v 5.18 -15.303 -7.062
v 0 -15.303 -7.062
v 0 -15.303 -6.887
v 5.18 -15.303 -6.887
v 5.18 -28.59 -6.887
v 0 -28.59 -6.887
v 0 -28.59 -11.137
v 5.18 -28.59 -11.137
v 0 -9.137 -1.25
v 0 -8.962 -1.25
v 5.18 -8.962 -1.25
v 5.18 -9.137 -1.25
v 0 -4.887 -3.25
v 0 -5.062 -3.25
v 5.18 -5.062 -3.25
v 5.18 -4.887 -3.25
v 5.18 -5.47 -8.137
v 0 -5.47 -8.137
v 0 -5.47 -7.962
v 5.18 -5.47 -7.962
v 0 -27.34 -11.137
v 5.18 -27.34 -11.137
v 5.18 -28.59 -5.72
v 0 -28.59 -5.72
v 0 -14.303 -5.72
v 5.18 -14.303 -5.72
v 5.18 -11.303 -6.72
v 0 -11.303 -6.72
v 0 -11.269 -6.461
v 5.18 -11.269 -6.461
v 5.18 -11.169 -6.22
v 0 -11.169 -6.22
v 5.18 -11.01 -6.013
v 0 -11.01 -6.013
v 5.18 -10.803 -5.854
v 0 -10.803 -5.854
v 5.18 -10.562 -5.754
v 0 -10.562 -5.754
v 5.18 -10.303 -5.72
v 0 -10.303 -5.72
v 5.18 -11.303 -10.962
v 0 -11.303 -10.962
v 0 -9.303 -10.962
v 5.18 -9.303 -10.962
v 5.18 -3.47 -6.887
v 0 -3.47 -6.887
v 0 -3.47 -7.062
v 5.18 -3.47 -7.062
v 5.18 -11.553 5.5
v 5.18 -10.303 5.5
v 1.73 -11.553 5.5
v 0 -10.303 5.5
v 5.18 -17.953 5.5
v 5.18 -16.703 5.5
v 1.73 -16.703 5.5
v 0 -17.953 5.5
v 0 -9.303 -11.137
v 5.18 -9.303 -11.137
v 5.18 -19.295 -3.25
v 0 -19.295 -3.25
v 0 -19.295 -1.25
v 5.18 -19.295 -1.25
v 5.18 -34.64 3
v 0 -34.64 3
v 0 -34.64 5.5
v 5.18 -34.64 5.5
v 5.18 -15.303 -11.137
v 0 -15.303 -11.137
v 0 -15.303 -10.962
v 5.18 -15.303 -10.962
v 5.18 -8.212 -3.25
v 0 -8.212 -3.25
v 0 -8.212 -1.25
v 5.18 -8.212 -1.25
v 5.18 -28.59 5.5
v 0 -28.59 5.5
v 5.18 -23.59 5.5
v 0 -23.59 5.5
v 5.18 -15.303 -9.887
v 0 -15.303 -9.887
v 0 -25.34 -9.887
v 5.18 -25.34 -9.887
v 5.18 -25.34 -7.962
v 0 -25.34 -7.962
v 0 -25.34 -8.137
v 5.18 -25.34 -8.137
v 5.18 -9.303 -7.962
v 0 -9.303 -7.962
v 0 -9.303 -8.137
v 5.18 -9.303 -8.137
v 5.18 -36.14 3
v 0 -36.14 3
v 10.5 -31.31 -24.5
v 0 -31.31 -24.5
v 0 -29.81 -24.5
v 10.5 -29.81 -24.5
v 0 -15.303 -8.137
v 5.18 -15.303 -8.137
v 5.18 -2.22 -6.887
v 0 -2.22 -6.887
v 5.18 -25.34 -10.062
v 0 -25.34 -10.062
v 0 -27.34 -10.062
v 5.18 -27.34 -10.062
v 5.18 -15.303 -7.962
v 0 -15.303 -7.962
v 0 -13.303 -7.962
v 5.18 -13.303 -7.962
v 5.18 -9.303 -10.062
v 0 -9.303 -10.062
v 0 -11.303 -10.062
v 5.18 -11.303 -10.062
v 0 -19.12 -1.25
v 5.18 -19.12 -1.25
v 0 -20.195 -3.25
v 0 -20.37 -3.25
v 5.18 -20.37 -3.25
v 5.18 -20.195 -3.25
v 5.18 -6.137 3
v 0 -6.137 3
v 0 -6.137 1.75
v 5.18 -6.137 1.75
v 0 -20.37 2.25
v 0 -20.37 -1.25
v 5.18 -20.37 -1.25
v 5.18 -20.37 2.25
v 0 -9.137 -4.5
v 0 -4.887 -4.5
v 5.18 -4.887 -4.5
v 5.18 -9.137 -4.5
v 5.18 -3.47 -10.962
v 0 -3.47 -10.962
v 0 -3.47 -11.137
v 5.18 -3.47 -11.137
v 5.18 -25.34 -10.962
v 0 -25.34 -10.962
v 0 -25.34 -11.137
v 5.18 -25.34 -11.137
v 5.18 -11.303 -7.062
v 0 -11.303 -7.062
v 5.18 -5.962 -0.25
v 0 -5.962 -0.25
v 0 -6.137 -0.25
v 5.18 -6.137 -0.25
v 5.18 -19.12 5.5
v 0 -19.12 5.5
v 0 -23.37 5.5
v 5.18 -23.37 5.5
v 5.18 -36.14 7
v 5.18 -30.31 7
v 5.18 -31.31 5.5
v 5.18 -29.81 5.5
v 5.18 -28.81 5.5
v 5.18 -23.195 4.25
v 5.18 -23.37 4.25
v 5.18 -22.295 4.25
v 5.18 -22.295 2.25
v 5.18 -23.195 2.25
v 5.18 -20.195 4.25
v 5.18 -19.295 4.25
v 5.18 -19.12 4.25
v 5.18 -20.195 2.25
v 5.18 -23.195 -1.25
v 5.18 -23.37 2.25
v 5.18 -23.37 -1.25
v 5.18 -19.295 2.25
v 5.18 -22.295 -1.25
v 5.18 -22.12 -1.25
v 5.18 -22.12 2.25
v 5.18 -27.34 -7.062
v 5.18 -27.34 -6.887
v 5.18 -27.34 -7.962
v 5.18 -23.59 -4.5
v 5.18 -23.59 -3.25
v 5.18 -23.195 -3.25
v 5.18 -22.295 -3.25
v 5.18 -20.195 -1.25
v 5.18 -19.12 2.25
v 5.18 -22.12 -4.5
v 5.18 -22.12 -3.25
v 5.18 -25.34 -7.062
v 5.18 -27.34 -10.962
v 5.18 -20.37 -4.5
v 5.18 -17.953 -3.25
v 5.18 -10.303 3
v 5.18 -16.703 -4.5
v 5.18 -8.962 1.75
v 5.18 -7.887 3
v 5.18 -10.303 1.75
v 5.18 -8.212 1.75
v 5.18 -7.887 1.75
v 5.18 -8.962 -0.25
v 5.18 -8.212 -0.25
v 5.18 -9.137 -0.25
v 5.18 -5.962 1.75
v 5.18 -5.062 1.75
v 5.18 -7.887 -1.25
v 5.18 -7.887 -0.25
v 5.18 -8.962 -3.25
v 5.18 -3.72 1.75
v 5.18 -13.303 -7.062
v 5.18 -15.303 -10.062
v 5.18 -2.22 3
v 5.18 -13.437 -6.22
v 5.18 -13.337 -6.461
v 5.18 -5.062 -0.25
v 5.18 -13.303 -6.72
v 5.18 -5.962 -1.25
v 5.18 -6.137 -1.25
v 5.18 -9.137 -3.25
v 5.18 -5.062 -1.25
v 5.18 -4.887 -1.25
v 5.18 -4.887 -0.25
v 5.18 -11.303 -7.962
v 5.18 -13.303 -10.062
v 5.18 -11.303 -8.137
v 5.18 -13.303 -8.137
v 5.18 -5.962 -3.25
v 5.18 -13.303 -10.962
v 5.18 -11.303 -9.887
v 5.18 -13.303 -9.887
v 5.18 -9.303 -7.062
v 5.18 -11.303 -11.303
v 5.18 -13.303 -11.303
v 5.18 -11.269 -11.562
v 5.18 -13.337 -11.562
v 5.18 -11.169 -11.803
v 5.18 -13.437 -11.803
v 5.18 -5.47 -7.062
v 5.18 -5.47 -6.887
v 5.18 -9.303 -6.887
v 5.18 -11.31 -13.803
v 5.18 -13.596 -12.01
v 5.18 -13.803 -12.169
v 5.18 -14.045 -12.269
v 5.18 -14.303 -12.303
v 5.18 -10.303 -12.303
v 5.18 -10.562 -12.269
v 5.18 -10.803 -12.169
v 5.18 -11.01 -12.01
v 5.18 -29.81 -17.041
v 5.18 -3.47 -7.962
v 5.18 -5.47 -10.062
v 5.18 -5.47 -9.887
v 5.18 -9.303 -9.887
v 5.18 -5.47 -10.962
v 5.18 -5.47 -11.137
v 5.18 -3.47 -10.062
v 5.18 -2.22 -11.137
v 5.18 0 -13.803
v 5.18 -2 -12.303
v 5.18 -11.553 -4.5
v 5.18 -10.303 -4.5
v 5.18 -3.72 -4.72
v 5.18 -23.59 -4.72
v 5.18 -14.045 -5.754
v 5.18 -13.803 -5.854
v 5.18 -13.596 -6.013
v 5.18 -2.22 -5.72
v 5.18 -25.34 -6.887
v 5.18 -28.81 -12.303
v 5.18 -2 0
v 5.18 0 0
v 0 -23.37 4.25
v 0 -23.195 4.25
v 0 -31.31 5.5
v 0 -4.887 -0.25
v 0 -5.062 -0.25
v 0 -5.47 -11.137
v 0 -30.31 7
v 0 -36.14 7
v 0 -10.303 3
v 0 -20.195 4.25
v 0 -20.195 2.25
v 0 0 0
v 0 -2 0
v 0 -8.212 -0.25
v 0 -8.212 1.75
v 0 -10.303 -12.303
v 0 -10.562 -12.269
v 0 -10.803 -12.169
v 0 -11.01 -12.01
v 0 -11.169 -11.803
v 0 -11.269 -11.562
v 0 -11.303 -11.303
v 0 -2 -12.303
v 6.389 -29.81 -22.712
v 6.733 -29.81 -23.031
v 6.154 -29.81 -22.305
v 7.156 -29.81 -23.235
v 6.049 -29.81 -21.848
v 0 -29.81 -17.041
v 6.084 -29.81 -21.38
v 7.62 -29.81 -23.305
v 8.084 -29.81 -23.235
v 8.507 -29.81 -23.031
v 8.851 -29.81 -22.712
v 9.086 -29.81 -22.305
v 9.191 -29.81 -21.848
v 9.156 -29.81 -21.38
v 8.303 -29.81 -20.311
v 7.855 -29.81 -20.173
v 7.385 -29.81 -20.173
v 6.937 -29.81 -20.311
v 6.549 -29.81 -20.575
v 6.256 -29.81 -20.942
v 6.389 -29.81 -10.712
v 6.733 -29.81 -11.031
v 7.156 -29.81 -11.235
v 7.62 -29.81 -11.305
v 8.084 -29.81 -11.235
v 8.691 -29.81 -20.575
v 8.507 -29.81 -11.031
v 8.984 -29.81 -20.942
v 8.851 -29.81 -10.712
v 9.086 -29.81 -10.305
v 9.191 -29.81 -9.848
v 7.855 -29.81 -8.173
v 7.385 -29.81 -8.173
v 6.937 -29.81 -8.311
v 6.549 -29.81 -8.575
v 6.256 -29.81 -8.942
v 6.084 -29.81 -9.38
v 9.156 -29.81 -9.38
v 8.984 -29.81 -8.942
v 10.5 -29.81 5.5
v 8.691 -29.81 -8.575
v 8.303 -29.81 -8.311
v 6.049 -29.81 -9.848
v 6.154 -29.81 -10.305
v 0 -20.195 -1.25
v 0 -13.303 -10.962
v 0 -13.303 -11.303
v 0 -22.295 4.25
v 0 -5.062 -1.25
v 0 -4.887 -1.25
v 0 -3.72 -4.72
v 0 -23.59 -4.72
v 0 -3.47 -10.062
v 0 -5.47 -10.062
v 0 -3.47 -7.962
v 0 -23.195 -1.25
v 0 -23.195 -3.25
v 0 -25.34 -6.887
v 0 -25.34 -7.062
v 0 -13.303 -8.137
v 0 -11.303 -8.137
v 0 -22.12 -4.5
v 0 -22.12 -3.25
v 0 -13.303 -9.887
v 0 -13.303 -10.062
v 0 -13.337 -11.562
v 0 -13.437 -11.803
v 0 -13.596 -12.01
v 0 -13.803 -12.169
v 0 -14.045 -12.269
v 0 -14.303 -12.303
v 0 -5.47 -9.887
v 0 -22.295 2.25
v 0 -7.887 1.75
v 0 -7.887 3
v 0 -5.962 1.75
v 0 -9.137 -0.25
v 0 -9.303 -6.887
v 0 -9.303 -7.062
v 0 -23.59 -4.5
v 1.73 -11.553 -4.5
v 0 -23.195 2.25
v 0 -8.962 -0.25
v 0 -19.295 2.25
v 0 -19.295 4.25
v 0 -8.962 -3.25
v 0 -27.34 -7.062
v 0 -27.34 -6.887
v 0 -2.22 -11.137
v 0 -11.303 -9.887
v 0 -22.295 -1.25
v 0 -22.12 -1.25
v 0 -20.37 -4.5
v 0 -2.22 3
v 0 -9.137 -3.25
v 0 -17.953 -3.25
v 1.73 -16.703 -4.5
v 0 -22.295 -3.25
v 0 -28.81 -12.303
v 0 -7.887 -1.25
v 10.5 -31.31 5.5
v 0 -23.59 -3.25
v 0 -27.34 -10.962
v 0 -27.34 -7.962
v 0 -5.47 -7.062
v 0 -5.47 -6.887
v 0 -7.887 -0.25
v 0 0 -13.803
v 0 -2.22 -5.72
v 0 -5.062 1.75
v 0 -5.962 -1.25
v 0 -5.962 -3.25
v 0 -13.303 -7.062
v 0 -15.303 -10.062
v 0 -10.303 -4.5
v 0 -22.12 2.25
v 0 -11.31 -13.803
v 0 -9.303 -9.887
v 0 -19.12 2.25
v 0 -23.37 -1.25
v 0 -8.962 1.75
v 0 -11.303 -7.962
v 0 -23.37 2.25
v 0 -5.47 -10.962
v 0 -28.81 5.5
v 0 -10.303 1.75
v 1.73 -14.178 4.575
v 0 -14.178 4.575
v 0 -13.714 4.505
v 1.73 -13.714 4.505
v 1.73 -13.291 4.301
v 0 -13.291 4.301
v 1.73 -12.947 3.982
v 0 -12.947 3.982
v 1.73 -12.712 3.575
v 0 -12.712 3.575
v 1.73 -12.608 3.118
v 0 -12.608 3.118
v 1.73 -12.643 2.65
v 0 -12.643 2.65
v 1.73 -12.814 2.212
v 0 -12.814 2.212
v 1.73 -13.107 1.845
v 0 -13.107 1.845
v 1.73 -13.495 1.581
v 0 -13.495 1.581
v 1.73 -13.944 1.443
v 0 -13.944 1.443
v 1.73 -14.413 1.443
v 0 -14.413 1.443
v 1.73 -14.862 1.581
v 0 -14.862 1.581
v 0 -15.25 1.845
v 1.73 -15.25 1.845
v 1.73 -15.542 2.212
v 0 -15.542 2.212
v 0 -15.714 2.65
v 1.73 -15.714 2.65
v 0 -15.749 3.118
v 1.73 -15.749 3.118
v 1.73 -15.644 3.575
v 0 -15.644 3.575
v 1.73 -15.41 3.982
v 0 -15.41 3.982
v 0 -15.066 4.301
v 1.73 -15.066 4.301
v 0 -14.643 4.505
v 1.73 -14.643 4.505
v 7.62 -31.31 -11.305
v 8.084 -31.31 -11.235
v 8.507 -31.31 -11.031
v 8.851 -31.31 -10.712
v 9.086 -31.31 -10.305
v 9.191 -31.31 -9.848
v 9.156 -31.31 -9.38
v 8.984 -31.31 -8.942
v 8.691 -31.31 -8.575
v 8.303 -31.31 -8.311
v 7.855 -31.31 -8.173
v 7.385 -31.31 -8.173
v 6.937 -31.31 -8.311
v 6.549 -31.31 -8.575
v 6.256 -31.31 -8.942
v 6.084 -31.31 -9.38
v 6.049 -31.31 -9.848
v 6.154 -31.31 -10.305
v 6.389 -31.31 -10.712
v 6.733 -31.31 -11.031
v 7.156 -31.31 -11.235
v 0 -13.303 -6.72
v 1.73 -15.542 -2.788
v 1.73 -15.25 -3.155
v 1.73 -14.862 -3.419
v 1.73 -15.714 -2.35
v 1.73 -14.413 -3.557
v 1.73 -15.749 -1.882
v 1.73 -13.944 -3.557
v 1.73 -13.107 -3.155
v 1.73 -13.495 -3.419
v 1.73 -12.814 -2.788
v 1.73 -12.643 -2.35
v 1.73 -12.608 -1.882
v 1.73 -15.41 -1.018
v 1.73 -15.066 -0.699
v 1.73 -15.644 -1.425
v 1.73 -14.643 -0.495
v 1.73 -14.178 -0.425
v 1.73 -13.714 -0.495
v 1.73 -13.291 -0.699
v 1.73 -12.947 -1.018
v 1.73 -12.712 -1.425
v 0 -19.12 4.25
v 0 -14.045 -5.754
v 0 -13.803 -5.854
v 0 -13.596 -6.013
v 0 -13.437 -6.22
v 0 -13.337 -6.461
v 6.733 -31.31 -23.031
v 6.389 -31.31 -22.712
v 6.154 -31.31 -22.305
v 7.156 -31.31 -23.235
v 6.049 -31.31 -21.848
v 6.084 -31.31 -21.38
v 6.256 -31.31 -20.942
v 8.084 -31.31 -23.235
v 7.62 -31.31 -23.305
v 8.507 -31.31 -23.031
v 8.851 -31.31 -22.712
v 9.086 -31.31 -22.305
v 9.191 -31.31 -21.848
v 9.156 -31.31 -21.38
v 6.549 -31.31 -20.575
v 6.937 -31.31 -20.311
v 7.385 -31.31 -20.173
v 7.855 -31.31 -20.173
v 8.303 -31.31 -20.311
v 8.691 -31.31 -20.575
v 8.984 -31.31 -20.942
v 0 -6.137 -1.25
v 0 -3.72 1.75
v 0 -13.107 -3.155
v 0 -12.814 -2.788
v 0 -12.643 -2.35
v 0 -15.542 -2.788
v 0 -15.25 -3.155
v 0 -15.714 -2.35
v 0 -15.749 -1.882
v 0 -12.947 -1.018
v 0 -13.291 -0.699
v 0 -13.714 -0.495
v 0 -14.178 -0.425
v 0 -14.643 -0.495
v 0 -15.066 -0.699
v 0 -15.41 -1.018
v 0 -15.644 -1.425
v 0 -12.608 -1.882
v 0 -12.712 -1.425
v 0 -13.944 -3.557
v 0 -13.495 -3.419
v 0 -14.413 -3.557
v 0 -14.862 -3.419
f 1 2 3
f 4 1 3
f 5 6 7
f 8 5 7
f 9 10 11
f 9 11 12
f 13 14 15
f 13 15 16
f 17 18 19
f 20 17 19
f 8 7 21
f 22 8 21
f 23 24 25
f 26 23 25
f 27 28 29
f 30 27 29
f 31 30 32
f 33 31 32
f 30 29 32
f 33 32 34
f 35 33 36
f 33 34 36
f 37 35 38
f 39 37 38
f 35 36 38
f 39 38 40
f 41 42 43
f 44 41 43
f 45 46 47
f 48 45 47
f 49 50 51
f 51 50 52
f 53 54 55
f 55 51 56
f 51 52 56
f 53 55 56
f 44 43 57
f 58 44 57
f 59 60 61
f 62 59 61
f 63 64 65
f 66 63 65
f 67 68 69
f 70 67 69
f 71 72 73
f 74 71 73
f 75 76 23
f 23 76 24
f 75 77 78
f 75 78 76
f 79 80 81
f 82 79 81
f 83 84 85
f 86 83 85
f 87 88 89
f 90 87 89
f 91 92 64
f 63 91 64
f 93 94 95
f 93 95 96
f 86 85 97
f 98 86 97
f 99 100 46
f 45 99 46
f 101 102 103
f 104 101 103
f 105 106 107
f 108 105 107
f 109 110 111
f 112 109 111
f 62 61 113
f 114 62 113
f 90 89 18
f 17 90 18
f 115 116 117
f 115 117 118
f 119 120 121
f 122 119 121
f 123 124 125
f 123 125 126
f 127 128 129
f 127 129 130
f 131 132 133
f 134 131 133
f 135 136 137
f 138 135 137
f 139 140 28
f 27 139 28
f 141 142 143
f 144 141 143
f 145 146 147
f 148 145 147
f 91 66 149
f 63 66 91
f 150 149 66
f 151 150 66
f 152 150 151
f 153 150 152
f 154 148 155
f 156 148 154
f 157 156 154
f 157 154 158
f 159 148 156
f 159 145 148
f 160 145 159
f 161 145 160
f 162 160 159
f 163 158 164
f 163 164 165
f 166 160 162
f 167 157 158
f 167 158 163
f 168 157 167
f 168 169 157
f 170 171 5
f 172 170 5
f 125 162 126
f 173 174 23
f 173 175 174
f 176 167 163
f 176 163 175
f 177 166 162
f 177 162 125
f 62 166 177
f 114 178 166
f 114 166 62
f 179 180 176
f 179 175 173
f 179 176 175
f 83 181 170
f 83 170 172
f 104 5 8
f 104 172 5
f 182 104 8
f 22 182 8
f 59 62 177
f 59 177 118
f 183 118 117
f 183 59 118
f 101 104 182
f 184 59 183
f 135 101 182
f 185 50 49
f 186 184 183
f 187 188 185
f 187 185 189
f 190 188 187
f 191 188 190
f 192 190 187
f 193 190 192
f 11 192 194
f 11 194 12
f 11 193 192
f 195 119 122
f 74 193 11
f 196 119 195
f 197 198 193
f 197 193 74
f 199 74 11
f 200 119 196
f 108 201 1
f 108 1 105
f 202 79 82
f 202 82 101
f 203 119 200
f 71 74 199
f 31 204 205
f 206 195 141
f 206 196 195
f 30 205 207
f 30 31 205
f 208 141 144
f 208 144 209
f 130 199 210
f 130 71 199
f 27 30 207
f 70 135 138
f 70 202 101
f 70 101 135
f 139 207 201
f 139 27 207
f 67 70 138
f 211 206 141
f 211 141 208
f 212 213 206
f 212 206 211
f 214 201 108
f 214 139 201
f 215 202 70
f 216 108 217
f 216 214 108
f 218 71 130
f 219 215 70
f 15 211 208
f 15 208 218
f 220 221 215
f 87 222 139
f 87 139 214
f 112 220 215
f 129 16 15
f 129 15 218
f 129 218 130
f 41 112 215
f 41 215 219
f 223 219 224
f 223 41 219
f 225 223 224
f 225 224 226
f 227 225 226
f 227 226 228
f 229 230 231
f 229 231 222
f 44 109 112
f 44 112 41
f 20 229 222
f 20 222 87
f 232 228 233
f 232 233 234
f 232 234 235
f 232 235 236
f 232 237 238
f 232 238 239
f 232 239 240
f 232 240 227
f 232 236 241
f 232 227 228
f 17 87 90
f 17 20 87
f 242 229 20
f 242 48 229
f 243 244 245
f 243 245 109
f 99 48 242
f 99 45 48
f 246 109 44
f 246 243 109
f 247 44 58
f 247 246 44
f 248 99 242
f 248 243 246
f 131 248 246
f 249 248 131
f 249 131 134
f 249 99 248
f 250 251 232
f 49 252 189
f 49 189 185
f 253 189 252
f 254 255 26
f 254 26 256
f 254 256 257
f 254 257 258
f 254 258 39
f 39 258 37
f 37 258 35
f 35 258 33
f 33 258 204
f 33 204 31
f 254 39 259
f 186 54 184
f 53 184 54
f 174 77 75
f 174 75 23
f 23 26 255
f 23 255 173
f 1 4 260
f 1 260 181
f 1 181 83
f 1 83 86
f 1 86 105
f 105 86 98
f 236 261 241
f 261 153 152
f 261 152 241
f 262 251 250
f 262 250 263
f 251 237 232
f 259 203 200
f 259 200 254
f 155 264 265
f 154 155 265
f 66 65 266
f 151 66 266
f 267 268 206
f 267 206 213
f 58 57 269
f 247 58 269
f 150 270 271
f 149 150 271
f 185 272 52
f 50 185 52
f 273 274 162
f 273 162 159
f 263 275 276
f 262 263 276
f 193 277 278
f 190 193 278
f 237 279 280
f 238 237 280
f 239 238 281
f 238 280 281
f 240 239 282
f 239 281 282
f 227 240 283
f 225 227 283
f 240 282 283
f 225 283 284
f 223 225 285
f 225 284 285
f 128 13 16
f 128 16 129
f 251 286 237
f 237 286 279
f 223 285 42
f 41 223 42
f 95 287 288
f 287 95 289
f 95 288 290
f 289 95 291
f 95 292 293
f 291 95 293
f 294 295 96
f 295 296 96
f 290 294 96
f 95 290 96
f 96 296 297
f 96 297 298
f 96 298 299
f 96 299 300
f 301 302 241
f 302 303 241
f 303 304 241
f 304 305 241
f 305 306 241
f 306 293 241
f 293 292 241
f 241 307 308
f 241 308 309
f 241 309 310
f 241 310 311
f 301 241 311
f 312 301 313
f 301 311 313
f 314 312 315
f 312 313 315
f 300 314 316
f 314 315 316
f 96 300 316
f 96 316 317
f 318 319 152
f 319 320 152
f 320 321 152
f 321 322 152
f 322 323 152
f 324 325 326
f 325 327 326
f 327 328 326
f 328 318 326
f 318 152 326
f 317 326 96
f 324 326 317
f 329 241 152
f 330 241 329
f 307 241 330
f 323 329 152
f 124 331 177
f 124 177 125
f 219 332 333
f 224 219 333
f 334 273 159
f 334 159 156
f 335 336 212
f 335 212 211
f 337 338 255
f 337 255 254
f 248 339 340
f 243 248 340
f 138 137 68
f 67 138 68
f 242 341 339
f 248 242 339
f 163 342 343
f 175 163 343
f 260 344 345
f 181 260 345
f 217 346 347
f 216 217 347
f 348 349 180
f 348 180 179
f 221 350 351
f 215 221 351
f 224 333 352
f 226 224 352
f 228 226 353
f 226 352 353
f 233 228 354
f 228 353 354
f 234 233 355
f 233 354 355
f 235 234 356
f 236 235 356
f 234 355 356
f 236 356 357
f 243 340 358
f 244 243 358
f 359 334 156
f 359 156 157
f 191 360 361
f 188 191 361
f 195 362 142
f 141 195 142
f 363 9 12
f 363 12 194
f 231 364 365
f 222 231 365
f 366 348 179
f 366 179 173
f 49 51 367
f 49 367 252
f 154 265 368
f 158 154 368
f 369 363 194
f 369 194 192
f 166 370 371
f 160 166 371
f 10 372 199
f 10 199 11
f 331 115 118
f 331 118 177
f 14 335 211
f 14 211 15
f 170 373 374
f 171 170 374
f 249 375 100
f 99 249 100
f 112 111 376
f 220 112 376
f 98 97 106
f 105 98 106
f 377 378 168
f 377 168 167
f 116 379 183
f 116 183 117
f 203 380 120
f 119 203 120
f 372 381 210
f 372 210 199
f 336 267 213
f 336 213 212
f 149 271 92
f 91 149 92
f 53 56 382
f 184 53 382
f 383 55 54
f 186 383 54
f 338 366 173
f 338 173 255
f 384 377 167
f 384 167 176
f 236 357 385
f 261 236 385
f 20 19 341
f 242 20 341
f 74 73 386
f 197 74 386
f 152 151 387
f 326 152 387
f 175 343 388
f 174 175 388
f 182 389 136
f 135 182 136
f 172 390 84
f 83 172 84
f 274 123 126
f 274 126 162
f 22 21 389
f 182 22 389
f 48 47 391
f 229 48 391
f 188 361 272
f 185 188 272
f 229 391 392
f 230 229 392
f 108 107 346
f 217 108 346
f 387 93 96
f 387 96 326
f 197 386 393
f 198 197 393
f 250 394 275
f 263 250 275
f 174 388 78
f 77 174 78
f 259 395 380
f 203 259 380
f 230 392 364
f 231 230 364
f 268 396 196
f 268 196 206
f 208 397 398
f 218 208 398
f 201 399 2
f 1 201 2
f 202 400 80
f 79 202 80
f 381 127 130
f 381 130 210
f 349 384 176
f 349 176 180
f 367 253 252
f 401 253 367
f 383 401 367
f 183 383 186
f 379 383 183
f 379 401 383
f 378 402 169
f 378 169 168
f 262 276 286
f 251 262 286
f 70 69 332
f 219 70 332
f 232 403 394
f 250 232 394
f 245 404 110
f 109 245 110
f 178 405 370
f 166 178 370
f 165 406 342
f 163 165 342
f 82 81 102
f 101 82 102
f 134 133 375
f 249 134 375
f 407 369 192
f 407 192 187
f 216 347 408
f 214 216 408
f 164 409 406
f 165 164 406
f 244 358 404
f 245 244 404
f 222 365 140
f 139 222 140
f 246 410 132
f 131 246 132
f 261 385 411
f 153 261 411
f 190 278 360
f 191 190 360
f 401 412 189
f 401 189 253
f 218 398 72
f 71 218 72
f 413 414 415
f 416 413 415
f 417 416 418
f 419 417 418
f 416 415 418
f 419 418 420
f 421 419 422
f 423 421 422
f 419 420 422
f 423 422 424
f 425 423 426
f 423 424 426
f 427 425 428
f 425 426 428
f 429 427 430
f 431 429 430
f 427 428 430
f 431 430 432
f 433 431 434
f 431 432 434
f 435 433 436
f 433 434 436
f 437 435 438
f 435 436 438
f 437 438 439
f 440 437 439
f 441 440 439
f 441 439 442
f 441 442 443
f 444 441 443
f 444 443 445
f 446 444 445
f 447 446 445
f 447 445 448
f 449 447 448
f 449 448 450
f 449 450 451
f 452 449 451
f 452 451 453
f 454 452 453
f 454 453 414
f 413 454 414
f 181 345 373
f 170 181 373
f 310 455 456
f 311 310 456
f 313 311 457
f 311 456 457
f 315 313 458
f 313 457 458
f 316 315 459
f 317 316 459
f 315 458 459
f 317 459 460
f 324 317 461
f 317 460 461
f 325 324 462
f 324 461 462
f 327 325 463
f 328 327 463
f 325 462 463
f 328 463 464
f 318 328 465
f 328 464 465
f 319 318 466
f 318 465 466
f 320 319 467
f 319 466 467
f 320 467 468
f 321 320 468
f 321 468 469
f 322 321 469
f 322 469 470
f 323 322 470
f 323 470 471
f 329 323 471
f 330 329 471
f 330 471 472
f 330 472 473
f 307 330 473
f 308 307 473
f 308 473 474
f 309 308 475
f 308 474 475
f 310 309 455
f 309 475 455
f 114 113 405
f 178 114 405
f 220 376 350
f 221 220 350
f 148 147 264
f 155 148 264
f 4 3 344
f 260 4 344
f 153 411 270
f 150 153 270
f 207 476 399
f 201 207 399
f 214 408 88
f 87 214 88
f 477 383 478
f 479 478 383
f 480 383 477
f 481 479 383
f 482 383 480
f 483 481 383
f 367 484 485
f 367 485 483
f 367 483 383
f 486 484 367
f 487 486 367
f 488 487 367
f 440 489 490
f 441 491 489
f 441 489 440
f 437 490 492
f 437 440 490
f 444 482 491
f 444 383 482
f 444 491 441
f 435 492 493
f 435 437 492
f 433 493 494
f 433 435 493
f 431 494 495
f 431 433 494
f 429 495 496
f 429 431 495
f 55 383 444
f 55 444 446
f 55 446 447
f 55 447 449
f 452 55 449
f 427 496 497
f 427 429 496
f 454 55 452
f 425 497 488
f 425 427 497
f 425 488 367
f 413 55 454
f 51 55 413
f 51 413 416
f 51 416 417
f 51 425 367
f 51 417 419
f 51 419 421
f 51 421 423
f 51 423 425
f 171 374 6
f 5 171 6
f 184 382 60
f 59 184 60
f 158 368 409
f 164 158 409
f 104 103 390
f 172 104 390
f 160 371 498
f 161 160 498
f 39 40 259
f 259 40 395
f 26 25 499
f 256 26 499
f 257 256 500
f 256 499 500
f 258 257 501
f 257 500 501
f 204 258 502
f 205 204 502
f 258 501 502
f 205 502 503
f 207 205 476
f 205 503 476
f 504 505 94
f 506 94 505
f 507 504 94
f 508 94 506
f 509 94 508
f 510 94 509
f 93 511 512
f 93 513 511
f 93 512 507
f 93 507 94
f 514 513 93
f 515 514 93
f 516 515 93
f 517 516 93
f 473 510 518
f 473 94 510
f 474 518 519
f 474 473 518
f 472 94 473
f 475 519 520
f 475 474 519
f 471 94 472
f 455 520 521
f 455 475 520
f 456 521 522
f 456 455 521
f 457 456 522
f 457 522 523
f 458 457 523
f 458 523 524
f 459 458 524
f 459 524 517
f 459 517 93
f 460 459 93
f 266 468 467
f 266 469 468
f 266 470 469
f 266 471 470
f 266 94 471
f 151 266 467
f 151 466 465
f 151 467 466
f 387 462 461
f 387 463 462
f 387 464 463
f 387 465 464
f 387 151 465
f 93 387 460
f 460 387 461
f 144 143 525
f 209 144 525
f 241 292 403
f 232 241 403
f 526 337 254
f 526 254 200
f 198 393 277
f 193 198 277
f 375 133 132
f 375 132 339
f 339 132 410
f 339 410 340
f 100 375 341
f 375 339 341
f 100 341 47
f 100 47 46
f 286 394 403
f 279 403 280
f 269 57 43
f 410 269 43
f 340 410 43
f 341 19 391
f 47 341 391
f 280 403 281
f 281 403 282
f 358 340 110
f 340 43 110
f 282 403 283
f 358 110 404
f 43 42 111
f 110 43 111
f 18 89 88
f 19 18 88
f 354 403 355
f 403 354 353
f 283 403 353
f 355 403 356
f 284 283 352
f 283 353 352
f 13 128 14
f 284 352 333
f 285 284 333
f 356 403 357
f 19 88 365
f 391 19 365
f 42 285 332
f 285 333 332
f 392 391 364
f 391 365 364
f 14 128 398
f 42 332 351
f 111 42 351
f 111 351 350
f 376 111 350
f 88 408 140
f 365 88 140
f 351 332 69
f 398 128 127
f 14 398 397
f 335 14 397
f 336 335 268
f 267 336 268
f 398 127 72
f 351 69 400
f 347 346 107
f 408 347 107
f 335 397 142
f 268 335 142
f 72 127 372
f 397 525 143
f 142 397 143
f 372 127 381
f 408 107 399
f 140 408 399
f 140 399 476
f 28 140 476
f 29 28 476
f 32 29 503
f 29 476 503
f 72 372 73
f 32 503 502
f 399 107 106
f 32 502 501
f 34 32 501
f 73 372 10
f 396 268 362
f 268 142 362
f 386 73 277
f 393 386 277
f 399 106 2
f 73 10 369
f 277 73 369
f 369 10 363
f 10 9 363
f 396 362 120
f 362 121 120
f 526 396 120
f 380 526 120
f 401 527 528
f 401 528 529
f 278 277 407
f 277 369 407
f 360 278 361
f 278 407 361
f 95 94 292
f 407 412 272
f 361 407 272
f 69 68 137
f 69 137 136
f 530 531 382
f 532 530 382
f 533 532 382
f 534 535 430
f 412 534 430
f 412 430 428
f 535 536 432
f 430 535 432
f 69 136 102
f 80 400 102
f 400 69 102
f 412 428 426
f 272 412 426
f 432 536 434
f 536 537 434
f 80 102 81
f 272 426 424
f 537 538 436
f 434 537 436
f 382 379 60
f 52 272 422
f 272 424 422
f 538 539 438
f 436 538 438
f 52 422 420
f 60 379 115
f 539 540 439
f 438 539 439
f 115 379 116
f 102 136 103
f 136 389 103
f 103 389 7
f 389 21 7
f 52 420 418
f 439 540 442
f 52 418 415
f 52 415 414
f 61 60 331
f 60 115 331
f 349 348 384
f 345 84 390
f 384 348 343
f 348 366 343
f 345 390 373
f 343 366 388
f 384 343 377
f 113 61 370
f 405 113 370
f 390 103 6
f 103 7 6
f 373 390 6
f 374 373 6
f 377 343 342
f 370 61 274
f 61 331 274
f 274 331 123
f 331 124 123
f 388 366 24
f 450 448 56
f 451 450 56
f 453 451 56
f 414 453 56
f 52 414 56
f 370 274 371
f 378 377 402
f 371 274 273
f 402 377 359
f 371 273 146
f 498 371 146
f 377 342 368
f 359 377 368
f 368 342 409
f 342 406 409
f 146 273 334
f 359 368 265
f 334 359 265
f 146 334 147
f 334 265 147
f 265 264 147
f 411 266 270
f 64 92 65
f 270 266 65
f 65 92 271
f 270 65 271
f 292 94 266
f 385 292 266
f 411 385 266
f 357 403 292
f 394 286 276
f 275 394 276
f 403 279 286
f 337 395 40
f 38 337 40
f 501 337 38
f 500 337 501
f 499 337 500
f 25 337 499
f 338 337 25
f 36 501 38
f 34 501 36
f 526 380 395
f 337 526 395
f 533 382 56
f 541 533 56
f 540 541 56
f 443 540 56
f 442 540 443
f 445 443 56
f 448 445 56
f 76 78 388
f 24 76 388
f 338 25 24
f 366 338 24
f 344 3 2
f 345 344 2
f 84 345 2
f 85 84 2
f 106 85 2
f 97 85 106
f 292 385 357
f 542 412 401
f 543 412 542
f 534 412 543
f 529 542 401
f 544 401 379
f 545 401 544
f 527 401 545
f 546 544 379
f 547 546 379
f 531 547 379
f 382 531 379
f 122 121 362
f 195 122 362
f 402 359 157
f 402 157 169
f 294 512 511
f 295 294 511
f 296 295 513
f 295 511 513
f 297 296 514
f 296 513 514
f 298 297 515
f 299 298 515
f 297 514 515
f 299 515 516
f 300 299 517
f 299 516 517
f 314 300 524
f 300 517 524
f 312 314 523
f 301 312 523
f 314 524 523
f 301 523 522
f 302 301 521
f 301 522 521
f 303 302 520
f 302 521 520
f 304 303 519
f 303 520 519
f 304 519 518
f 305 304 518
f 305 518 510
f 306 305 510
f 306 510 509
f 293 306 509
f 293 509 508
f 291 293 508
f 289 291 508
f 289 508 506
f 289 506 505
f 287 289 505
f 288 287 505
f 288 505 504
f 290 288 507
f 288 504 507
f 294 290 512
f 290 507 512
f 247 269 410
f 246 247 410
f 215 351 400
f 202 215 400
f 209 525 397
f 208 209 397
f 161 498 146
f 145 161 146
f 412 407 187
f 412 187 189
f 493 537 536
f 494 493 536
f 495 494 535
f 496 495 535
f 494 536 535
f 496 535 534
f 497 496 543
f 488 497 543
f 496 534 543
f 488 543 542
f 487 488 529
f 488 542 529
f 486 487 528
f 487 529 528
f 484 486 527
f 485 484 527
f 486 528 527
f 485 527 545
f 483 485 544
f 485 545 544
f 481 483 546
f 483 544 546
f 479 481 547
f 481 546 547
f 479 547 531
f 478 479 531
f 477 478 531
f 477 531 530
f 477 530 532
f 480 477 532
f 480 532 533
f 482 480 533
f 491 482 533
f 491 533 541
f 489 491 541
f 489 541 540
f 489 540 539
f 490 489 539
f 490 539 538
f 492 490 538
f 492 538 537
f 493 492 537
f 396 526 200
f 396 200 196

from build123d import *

# Parameters (mm, degrees)
BOSS_EXTRUDE1_DEPTH = 5.18
CUT_EXTRUDE4_REACH  = 45.046
SKETCH2_W           = 3.45
SKETCH2_H           = 5.15
CUT_EXTRUDE3_REACH  = 42.402
SKETCH7_R           = 1.575
SKETCH3_W           = 10.5
SKETCH3_H           = 30
SKETCH3_R           = 1.575
BOSS_EXTRUDE2_DEPTH = 1.5


with BuildPart() as part:
    # Sketch1 → Boss-Extrude1 (new body)
    with BuildSketch(Plane(origin=(0, 0, 0), x_dir=(0, 0, -1), z_dir=(1, 0, 0))):
        with BuildLine():
            Line((-5.5, -10.303333333), (-5.5, -17.953333333))
            Line((-5.5, -17.953333333), (3.25, -17.953333333))
            Line((3.25, -17.953333333), (3.25, -19.295))
            Line((3.25, -19.295), (1.25, -19.295))
            Line((1.25, -19.295), (1.25, -19.12))
            Line((1.25, -19.12), (-2.25, -19.12))
            Line((-2.25, -19.12), (-2.25, -19.295))
            Line((-2.25, -19.295), (-4.25, -19.295))
            Line((-4.25, -19.295), (-4.25, -19.12))
            Line((-4.25, -19.12), (-5.5, -19.12))
            Line((-5.5, -19.12), (-5.5, -23.37))
            Line((-5.5, -23.37), (-4.25, -23.37))
            Line((-4.25, -23.37), (-4.25, -23.195))
            Line((-4.25, -23.195), (-2.25, -23.195))
            Line((-2.25, -23.195), (-2.25, -23.37))
            Line((-2.25, -23.37), (1.25, -23.37))
            Line((1.25, -23.37), (1.25, -23.195))
            Line((1.25, -23.195), (3.25, -23.195))
            Line((3.25, -23.195), (3.25, -23.59))
            Line((3.25, -23.59), (-5.5, -23.59))
            Line((-5.5, -23.59), (-5.5, -28.59))
            Line((-5.5, -28.59), (5.72, -28.59))
            Line((5.72, -28.59), (5.72, -14.303333333))
            ThreePointArc((5.72, -14.303333333), (6.012893219, -13.596226552), (6.72, -13.303333333))
            Line((6.72, -13.303333333), (7.061666667, -13.303333333))
            Line((7.061666667, -13.303333333), (7.061666667, -15.303333333))
            Line((7.061666667, -15.303333333), (6.886666667, -15.303333333))
            Line((6.886666667, -15.303333333), (6.886666667, -25.34))
            Line((6.886666667, -25.34), (7.061666667, -25.34))
            Line((7.061666667, -25.34), (7.061666667, -27.34))
            Line((7.061666667, -27.34), (6.886666667, -27.34))
            Line((6.886666667, -27.34), (6.886666667, -28.59))
            Line((6.886666667, -28.59), (11.136666667, -28.59))
            Line((11.136666667, -28.59), (11.136666667, -27.34))
            Line((11.136666667, -27.34), (10.961666667, -27.34))
            Line((10.961666667, -27.34), (10.961666667, -25.34))
            Line((10.961666667, -25.34), (11.136666667, -25.34))
            Line((11.136666667, -25.34), (11.136666667, -15.303333333))
            Line((11.136666667, -15.303333333), (10.961666667, -15.303333333))
            Line((10.961666667, -15.303333333), (10.961666667, -13.303333333))
            Line((10.961666667, -13.303333333), (11.303333333, -13.303333333))
            ThreePointArc((11.303333333, -13.303333333), (12.010440115, -13.596226552), (12.303333333, -14.303333333))
            Line((12.303333333, -14.303333333), (12.303333333, -28.81))
            Line((12.303333333, -28.81), (-5.5, -28.81))
            Line((-5.5, -28.81), (-7, -30.31))
            Line((-7, -30.31), (-7, -36.14))
            Line((-7, -36.14), (-3, -36.14))
            Line((-3, -36.14), (-3, -34.64))
            Line((-3, -34.64), (-5.5, -34.64))
            Line((-5.5, -34.64), (-5.5, -31.31))
            Line((-5.5, -31.31), (17.303333333, -31.31))
            Line((17.303333333, -31.31), (13.803333333, -11.31))
            Line((13.803333333, -11.31), (13.803333333, 0))
            Line((13.803333333, 0), (0, 0))
            Line((0, 0), (0, -2))
            Line((0, -2), (12.303333333, -2))
            Line((12.303333333, -2), (12.303333333, -10.303333333))
            ThreePointArc((12.303333333, -10.303333333), (12.010440115, -11.010440115), (11.303333333, -11.303333333))
            Line((11.303333333, -11.303333333), (10.961666667, -11.303333333))
            Line((10.961666667, -11.303333333), (10.961666667, -9.303333333))
            Line((10.961666667, -9.303333333), (11.136666667, -9.303333333))
            Line((11.136666667, -9.303333333), (11.136666667, -5.47))
            Line((11.136666667, -5.47), (10.961666667, -5.47))
            Line((10.961666667, -5.47), (10.961666667, -3.47))
            Line((10.961666667, -3.47), (11.136666667, -3.47))
            Line((11.136666667, -3.47), (11.136666667, -2.22))
            Line((11.136666667, -2.22), (6.886666667, -2.22))
            Line((6.886666667, -2.22), (6.886666667, -3.47))
            Line((6.886666667, -3.47), (7.061666667, -3.47))
            Line((7.061666667, -3.47), (7.061666667, -5.47))
            Line((7.061666667, -5.47), (6.886666667, -5.47))
            Line((6.886666667, -5.47), (6.886666667, -9.303333333))
            Line((6.886666667, -9.303333333), (7.061666667, -9.303333333))
            Line((7.061666667, -9.303333333), (7.061666667, -11.303333333))
            Line((7.061666667, -11.303333333), (6.72, -11.303333333))
            ThreePointArc((6.72, -11.303333333), (6.012893219, -11.010440115), (5.72, -10.303333333))
            Line((5.72, -10.303333333), (5.72, -2.22))
            Line((5.72, -2.22), (-3, -2.22))
            Line((-3, -2.22), (-3, -6.136666667))
            Line((-3, -6.136666667), (-1.75, -6.136666667))
            Line((-1.75, -6.136666667), (-1.75, -5.961666667))
            Line((-1.75, -5.961666667), (0.25, -5.961666667))
            Line((0.25, -5.961666667), (0.25, -6.136666667))
            Line((0.25, -6.136666667), (1.25, -6.136666667))
            Line((1.25, -6.136666667), (1.25, -5.961666667))
            Line((1.25, -5.961666667), (3.25, -5.961666667))
            Line((3.25, -5.961666667), (3.25, -8.211666667))
            Line((3.25, -8.211666667), (1.25, -8.211666667))
            Line((1.25, -8.211666667), (1.25, -7.886666667))
            Line((1.25, -7.886666667), (0.25, -7.886666667))
            Line((0.25, -7.886666667), (0.25, -8.211666667))
            Line((0.25, -8.211666667), (-1.75, -8.211666667))
            Line((-1.75, -8.211666667), (-1.75, -7.886666667))
            Line((-1.75, -7.886666667), (-3, -7.886666667))
            Line((-3, -7.886666667), (-3, -10.303333333))
            Line((-3, -10.303333333), (-5.5, -10.303333333))
        make_face()
        Polygon((-1.75, -10.303333333), (4.5, -10.303333333), (4.5, -20.37), (3.25, -20.37), (3.25, -20.195), (1.25, -20.195), (1.25, -20.37), (-2.25, -20.37), (-2.25, -20.195), (-4.25, -20.195), (-4.25, -22.295), (-2.25, -22.295), (-2.25, -22.12), (1.25, -22.12), (1.25, -22.295), (3.25, -22.295), (3.25, -22.12), (4.5, -22.12), (4.5, -23.59), (4.72, -23.59), (4.72, -3.72), (-1.75, -3.72), (-1.75, -5.061666667), (0.25, -5.061666667), (0.25, -4.886666667), (1.25, -4.886666667), (1.25, -5.061666667), (3.25, -5.061666667), (3.25, -4.886666667), (4.5, -4.886666667), (4.5, -9.136666667), (3.25, -9.136666667), (3.25, -8.961666667), (1.25, -8.961666667), (1.25, -9.136666667), (0.25, -9.136666667), (0.25, -8.961666667), (-1.75, -8.961666667), align=None, mode=Mode.SUBTRACT)
        Polygon((10.061666667, -27.34), (7.961666667, -27.34), (7.961666667, -25.34), (8.136666667, -25.34), (8.136666667, -15.303333333), (7.961666667, -15.303333333), (7.961666667, -13.303333333), (8.136666667, -13.303333333), (8.136666667, -11.303333333), (7.961666667, -11.303333333), (7.961666667, -9.303333333), (8.136666667, -9.303333333), (8.136666667, -5.47), (7.961666667, -5.47), (7.961666667, -3.47), (10.061666667, -3.47), (10.061666667, -5.47), (9.886666667, -5.47), (9.886666667, -9.303333333), (10.061666667, -9.303333333), (10.061666667, -11.303333333), (9.886666667, -11.303333333), (9.886666667, -13.303333333), (10.061666667, -13.303333333), (10.061666667, -15.303333333), (9.886666667, -15.303333333), (9.886666667, -25.34), (10.061666667, -25.34), align=None, mode=Mode.SUBTRACT)
    extrude(amount=BOSS_EXTRUDE1_DEPTH)

    # Sketch2 → Cut-Extrude4 (cut, up to next)
    with BuildSketch(Plane.XY.offset(5.5), mode=Mode.PRIVATE) as cut_extrude4_sk1:
        with Locations((3.455, -14.128333333)):
            Rectangle(SKETCH2_W, SKETCH2_H)
    cut_extrude4_tool1 = extrude(cut_extrude4_sk1.sketch, amount=-CUT_EXTRUDE4_REACH, mode=Mode.PRIVATE) & part.part
    add(cut_extrude4_tool1.solids().sort_by_distance((3.455, -14.128333, 5.5))[0], mode=Mode.SUBTRACT)

    # Sketch7 → Cut-Extrude3 (cut, up to next)
    with BuildSketch(Plane.ZY, mode=Mode.PRIVATE) as cut_extrude3_sk1:
        with Locations((3, -14.178333333)):
            Circle(SKETCH7_R)
    cut_extrude3_tool1 = extrude(cut_extrude3_sk1.sketch, amount=-CUT_EXTRUDE3_REACH, mode=Mode.PRIVATE) & part.part
    # Sketch7 → Cut-Extrude3 (cut, up to next)
    with BuildSketch(Plane.ZY, mode=Mode.PRIVATE) as cut_extrude3_sk2:
        with Locations((-2, -14.178333333)):
            Circle(SKETCH7_R)
    cut_extrude3_tool2 = extrude(cut_extrude3_sk2.sketch, amount=-CUT_EXTRUDE3_REACH, mode=Mode.PRIVATE) & part.part
    add(cut_extrude3_tool1.solids().sort_by_distance((0, -14.178333, 3))[0], mode=Mode.SUBTRACT)
    add(cut_extrude3_tool2.solids().sort_by_distance((0, -14.178333, -2))[0], mode=Mode.SUBTRACT)

    # Sketch3 → Boss-Extrude2 (add)
    with BuildSketch(Plane.XZ.offset(31.31)):
        with Locations((5.25, -9.5)):
            Rectangle(SKETCH3_W, SKETCH3_H)
        with Locations(Location((7.62, -9.73, 0), (0, 0, 270))):
            Circle(SKETCH3_R, mode=Mode.SUBTRACT)
        with Locations(Location((7.62, -21.73, 0), (0, 0, 270))):
            Circle(SKETCH3_R, mode=Mode.SUBTRACT)
    extrude(amount=-BOSS_EXTRUDE2_DEPTH)


solid = part.part
